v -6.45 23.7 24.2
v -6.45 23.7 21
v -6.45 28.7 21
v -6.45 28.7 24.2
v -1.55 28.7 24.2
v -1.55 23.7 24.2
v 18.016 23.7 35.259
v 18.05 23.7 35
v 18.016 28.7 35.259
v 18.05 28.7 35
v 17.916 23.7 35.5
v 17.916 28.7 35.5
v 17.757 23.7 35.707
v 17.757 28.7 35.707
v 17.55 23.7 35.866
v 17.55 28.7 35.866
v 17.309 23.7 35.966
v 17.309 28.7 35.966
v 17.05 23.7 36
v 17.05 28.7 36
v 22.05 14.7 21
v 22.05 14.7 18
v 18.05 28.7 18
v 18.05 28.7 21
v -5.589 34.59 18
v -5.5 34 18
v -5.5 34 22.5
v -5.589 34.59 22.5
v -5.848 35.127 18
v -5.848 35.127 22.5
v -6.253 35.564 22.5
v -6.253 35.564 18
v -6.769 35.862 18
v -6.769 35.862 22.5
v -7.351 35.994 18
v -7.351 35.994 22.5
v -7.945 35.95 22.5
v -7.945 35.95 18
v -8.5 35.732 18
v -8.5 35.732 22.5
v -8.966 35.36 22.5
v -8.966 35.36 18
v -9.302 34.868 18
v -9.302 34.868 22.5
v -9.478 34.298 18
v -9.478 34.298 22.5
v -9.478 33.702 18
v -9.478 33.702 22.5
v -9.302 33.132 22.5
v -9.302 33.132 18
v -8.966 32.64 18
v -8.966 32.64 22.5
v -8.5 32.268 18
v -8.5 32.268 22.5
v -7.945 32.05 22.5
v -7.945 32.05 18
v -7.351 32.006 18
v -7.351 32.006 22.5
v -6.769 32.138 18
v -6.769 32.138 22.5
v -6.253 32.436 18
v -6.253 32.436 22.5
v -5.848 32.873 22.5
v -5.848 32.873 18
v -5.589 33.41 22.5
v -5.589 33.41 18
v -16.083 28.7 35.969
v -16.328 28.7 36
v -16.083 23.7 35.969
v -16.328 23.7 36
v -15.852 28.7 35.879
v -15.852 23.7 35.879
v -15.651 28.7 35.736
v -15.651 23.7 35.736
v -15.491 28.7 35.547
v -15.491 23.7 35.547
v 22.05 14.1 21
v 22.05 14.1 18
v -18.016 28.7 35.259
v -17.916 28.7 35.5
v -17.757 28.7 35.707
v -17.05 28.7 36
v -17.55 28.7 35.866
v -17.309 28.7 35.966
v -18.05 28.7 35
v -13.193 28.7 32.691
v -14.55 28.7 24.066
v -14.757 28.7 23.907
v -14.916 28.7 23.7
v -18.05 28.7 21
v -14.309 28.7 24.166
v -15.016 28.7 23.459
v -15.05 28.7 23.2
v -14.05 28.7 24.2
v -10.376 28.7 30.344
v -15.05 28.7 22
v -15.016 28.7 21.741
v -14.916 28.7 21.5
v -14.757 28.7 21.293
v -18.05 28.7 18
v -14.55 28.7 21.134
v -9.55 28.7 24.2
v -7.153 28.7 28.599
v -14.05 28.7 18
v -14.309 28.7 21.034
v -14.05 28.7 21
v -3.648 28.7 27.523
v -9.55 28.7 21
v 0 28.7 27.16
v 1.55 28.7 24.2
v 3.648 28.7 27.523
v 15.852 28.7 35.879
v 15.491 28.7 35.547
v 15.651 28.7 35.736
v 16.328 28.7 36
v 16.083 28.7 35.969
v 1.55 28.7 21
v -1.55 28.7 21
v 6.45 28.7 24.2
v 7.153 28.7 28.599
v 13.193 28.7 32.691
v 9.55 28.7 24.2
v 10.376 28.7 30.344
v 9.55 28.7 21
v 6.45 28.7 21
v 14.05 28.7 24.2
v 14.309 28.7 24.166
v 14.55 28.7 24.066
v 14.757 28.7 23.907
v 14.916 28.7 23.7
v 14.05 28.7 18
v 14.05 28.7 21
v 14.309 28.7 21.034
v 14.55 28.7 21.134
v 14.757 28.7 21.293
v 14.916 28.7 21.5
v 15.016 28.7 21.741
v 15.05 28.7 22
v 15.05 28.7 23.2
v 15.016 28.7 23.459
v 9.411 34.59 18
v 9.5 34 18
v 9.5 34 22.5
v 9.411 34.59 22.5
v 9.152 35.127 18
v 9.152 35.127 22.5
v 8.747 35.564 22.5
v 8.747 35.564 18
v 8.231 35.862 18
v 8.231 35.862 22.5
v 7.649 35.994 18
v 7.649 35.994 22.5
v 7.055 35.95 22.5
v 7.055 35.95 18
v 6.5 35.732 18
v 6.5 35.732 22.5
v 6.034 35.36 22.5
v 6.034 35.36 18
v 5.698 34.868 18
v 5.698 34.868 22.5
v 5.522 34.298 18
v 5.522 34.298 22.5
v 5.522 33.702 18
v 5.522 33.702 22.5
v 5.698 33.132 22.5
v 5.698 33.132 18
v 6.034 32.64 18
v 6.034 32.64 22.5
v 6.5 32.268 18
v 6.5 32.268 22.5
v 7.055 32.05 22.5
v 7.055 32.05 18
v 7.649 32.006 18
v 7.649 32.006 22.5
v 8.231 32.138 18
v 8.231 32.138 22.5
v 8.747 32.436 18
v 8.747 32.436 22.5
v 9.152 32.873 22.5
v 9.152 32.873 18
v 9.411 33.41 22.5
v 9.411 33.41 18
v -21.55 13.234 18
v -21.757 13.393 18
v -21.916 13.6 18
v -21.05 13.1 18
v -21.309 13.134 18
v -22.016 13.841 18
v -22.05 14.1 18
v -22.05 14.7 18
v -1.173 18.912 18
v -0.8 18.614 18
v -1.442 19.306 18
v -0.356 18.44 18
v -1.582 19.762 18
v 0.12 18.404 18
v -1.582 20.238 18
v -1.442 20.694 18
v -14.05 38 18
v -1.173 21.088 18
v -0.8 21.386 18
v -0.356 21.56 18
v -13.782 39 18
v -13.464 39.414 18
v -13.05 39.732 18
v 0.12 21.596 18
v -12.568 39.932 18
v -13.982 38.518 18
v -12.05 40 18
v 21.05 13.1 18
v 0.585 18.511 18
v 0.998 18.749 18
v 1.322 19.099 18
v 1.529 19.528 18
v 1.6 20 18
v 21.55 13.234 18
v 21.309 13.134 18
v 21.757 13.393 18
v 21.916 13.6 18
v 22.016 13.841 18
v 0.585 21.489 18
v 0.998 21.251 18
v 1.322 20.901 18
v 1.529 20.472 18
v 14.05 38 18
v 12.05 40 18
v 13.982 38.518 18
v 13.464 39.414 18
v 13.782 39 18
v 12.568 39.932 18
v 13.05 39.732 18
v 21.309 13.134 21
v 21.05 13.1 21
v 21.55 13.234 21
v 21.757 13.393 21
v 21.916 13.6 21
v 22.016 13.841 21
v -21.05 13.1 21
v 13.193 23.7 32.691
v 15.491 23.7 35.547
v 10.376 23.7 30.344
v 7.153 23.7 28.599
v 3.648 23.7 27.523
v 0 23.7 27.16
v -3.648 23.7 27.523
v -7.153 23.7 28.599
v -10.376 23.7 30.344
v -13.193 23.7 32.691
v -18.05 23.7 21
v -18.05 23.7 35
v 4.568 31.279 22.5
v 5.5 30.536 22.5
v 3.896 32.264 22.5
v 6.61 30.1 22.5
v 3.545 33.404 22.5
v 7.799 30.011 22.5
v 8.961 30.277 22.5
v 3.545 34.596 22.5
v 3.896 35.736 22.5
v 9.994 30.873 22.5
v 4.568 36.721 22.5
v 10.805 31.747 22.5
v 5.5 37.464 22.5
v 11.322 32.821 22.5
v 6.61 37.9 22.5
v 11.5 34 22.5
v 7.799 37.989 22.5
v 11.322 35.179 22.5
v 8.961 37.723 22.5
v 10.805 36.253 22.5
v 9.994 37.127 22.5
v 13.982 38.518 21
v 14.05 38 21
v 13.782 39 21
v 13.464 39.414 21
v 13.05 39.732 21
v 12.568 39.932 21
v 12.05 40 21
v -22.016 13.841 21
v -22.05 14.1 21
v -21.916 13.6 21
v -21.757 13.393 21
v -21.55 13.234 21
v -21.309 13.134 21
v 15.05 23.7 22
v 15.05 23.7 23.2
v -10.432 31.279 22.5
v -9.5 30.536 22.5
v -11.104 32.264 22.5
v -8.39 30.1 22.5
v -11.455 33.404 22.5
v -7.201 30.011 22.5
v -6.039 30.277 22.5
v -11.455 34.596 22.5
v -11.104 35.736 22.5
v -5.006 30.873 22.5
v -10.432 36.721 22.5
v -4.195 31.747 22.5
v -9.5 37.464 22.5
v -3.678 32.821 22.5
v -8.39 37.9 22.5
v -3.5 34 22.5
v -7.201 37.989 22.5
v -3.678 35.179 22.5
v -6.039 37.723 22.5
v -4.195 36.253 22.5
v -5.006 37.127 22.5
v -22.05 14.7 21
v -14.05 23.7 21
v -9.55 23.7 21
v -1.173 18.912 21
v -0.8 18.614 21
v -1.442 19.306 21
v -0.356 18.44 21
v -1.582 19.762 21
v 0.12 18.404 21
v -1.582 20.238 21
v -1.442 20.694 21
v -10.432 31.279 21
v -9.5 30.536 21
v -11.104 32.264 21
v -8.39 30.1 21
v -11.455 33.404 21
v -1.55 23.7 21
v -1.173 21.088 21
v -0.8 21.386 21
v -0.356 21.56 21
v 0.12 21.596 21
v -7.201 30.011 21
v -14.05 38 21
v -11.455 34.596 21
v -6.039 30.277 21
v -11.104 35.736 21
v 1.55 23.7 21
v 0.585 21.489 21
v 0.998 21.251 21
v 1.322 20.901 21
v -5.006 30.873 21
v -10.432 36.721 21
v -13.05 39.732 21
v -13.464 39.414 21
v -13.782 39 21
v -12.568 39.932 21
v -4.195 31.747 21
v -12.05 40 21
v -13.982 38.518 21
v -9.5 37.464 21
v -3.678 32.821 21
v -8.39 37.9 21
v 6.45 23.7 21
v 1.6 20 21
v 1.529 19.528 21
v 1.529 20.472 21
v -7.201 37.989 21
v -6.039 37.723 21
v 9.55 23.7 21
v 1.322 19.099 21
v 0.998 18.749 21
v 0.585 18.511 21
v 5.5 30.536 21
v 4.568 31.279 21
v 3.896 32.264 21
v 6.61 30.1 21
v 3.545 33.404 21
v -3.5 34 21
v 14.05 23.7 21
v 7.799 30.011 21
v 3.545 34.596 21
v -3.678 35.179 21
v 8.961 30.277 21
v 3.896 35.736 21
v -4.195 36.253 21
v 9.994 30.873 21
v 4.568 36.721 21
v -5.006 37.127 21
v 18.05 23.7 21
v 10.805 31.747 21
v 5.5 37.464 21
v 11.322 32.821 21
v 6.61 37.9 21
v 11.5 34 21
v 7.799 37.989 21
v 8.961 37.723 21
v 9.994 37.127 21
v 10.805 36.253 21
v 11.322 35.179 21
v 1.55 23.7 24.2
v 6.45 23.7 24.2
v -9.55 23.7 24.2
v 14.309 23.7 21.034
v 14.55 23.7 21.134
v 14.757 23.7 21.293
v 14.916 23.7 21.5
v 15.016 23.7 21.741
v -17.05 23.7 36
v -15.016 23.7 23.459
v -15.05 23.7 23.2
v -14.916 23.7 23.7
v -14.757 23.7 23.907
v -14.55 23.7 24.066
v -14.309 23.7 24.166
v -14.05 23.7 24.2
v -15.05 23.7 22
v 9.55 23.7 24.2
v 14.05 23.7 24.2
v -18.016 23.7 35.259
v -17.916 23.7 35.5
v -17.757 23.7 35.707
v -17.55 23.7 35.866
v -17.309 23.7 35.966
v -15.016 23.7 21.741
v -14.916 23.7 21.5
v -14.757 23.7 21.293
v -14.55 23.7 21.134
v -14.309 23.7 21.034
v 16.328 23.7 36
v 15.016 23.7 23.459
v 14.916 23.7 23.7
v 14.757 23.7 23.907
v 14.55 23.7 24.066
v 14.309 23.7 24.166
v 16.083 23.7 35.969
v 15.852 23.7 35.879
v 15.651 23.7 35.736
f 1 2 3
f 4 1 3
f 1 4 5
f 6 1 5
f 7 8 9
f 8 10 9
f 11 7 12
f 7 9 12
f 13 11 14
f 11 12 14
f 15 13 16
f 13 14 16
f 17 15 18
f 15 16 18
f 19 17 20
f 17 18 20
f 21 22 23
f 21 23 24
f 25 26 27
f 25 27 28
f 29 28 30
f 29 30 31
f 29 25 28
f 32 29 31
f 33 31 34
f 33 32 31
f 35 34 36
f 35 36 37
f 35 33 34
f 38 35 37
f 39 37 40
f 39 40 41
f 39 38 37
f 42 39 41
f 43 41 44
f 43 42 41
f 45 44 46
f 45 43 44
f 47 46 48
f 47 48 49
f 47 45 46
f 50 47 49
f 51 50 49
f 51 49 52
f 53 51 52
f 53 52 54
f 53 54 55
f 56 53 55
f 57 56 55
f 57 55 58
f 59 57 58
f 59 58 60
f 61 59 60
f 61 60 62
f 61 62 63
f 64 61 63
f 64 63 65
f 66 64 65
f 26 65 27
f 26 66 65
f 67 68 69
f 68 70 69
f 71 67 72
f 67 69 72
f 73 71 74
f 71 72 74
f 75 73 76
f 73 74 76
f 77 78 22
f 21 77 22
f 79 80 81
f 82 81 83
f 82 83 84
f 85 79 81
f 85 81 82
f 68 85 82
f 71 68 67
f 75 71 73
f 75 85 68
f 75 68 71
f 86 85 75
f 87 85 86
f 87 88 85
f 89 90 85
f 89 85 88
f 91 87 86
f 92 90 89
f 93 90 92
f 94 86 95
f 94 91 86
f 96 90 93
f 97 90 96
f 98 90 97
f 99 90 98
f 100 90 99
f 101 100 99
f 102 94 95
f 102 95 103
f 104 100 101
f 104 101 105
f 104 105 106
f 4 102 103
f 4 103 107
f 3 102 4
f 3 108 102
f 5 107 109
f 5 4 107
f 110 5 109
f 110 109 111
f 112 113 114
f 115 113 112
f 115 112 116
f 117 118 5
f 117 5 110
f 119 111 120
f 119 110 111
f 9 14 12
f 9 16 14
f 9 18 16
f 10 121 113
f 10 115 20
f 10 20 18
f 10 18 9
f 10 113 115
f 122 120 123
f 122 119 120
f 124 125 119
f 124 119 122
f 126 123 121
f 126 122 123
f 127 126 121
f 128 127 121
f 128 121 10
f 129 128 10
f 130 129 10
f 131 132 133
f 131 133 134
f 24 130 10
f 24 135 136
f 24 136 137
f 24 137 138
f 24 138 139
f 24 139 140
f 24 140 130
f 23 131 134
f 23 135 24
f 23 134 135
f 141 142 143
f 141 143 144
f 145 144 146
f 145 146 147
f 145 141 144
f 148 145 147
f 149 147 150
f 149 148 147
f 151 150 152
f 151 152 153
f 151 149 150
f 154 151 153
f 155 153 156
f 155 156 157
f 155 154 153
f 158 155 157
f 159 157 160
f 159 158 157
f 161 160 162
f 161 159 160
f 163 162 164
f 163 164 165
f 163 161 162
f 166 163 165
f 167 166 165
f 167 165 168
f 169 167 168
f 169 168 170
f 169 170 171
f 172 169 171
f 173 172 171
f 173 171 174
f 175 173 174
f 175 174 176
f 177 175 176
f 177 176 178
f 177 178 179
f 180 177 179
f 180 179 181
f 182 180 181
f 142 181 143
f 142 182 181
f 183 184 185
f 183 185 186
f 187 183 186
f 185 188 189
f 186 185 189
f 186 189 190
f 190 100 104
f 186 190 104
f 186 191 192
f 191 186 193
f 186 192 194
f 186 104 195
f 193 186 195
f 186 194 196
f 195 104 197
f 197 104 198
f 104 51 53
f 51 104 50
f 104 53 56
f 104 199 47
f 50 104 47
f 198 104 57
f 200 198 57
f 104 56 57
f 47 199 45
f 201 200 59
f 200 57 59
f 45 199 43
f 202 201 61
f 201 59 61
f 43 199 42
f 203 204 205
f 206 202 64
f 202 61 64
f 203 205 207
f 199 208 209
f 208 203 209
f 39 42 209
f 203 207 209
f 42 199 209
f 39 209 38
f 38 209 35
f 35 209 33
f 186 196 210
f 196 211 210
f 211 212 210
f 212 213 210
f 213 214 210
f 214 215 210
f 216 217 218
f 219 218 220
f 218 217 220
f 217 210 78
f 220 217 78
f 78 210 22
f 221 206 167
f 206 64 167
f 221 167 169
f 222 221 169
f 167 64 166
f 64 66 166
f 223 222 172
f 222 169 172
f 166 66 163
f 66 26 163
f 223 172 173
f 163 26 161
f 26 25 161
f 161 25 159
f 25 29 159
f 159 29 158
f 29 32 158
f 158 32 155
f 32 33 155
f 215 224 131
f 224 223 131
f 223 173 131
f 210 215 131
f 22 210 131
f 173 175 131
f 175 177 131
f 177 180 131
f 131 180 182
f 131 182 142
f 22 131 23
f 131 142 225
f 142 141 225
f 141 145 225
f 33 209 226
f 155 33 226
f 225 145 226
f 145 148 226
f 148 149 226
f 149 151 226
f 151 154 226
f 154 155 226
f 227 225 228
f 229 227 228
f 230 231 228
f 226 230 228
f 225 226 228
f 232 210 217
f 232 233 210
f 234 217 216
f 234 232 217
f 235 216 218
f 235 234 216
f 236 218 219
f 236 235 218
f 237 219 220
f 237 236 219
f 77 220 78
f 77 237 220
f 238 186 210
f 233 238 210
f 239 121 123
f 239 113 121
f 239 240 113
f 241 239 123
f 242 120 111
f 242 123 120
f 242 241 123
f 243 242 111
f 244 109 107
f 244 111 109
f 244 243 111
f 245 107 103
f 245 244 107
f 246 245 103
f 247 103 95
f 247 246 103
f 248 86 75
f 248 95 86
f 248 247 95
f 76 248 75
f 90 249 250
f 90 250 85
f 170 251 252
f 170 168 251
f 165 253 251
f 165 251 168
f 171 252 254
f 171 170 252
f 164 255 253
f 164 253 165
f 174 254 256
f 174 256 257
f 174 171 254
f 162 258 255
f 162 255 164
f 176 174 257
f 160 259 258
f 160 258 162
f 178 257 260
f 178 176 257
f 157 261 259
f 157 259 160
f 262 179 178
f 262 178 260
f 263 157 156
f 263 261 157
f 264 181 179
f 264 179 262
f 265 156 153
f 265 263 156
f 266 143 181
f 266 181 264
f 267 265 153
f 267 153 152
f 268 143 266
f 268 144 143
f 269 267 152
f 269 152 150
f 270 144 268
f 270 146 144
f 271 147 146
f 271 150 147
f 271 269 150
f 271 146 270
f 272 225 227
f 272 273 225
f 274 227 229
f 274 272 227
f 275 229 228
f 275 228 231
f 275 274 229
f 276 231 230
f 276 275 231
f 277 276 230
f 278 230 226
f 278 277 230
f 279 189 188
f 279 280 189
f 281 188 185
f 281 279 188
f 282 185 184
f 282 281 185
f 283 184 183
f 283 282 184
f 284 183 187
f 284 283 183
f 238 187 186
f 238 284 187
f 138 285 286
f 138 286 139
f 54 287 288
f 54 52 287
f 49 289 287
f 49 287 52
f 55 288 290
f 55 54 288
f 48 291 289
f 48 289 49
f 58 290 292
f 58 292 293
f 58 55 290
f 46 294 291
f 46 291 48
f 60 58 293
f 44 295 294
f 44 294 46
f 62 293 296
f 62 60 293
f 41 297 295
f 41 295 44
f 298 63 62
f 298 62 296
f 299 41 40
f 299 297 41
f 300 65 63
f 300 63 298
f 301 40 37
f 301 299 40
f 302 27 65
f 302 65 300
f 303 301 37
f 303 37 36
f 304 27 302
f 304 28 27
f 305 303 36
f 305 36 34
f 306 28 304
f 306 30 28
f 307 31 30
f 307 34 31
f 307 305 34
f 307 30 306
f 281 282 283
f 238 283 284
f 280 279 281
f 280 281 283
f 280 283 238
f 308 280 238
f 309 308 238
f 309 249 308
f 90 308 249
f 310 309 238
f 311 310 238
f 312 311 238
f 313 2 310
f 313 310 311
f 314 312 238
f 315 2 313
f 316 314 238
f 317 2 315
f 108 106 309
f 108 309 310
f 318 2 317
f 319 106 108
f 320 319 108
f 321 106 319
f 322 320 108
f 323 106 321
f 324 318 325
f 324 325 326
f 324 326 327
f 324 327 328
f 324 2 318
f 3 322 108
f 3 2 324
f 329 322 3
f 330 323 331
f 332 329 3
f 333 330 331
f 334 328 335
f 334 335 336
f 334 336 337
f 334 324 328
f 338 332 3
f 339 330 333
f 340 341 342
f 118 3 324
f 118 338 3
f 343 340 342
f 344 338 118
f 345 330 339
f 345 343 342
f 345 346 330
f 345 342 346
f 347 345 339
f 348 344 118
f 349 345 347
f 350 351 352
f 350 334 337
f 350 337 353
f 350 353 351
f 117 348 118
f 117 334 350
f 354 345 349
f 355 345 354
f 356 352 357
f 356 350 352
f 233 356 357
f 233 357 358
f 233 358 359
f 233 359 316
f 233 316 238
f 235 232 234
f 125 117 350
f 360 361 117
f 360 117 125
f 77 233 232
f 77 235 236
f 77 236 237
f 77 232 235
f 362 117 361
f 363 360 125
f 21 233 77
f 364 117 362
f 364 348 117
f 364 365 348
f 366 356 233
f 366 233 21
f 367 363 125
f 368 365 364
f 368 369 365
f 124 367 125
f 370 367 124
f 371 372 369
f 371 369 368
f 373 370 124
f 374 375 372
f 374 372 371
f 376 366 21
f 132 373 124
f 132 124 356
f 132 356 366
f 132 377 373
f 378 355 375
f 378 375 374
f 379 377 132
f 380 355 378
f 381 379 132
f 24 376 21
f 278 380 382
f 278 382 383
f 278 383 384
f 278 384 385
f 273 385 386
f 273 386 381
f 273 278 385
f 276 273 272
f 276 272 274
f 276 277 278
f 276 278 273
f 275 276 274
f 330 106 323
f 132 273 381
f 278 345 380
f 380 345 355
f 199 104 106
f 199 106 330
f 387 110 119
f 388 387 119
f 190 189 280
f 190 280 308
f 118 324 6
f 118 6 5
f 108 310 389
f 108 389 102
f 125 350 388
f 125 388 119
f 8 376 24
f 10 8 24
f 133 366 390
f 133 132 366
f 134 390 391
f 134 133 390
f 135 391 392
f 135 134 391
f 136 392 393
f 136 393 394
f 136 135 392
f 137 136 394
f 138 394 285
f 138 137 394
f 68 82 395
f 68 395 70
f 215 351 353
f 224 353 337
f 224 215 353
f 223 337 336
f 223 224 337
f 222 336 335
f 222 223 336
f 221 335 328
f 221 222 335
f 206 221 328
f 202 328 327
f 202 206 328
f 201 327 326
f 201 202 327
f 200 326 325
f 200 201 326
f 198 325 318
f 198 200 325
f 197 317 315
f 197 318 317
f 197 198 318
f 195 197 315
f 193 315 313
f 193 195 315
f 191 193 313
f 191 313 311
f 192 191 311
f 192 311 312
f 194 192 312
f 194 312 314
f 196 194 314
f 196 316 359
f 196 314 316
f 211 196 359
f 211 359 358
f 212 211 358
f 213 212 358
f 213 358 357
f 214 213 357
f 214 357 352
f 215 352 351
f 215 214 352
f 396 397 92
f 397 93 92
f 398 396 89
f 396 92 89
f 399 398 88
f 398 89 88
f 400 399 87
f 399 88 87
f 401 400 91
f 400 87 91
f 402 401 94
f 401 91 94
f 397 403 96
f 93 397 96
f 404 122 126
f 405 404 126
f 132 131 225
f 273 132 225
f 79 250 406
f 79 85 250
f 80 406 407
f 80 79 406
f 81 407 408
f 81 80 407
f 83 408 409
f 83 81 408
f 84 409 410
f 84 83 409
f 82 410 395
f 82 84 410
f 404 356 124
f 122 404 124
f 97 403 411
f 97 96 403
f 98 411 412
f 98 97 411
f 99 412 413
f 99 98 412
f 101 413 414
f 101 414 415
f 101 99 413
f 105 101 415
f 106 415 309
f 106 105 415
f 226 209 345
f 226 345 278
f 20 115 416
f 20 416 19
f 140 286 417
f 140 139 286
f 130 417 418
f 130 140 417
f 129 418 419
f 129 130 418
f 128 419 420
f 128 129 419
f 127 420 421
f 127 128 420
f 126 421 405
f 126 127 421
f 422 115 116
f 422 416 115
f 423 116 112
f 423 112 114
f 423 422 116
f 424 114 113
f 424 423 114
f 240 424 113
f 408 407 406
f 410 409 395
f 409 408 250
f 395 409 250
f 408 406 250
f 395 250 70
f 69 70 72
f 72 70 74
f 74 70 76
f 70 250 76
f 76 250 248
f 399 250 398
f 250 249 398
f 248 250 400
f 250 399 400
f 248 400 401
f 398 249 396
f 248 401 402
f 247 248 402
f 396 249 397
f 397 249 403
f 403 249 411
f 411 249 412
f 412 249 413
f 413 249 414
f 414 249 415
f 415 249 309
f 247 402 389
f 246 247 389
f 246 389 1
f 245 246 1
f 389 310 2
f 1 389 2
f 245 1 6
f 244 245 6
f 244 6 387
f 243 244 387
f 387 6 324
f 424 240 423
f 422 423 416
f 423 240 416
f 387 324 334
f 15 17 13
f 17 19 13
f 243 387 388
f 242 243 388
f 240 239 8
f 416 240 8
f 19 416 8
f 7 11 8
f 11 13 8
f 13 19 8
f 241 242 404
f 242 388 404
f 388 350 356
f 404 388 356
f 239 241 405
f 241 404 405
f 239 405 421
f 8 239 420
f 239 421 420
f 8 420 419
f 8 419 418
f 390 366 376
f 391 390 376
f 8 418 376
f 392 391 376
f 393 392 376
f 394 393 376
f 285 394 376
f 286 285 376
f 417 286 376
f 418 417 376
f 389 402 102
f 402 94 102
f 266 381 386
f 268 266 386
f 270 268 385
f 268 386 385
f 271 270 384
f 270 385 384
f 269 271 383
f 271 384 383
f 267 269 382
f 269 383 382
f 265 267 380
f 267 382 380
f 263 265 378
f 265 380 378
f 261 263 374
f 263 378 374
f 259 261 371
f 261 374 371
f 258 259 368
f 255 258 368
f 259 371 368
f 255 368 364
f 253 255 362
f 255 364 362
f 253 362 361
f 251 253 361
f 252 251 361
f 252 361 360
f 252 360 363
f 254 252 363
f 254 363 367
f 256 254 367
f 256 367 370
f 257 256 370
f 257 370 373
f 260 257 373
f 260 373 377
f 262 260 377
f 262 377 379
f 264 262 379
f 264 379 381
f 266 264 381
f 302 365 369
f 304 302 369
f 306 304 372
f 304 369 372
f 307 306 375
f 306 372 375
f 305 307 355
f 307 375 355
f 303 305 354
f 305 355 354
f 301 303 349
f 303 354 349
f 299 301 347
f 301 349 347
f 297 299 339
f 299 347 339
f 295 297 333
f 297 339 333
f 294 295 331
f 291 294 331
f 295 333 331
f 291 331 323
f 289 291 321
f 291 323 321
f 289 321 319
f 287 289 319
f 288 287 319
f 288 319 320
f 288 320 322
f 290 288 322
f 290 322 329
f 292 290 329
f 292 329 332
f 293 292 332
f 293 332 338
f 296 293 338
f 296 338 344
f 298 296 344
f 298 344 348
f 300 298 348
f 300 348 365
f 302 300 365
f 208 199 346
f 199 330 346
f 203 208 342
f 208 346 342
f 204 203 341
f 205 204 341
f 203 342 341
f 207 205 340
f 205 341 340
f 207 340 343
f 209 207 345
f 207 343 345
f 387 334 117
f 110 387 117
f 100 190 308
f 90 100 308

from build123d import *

# Parameters (mm, degrees)
CYLINDER006_R                   = 1.6
CYLINDER006_DEPTH               = 10
BOX007_W                        = 3.1
BOX007_H                        = 5
BOX007_DEPTH                    = 8
BOX009_W                        = 3.1
BOX009_H                        = 5
BOX009_DEPTH                    = 9
BOX010_W                        = 3.1
BOX010_H                        = 5
BOX010_DEPTH                    = 9
BOX012_W                        = 31
BOX012_H                        = 6
BOX012_DEPTH                    = 6
CYLINDER004_R                   = 21.5
CYLINDER004_DEPTH               = 10
BOX008_W                        = 30.1
BOX008_H                        = 5
BOX008_DEPTH                    = 18
FILLET001003_R                  = 1
FILLET001007_R                  = 1
CYLINDER003_R                   = 18.5
CYLINDER003_DEPTH               = 10
BOX005_W                        = 36.1
BOX005_H                        = 5
BOX005_DEPTH                    = 18
FILLET001004_R                  = 1
CYLINDER010_R                   = 2
CYLINDER010_DEPTH               = 4.5
CYLINDER011_R                   = 2
CYLINDER011_DEPTH               = 4.5
CYLINDER008_R                   = 4
CYLINDER008_DEPTH               = 4.5
BOX011_W                        = 28.1
BOX011_H                        = 12
BOX011_DEPTH                    = 3
FILLET001006_R                  = 2
CYLINDER009_R                   = 4
CYLINDER009_DEPTH               = 4.5
BOX006_W                        = 44.1
BOX006_H                        = 15.6
BOX006_DEPTH                    = 3
FILLET001005_R                  = 1
CHAMFER005021077002006002_SIZE2 = 14
CHAMFER005021077002006002_SIZE  = 4
CHAMFER005021077002006003_SIZE2 = 14
CHAMFER005021077002006003_SIZE  = 4


with BuildPart() as cylinder006:
    # Cylinder006 → Cylinder006 (new body)
    with BuildSketch(Plane(origin=(0, 20, 18), x_dir=(1, 0, 0), z_dir=(0, 0, 1))):
        Circle(CYLINDER006_R)
    extrude(amount=CYLINDER006_DEPTH)


with BuildPart() as cube007:
    # Box007 → Box007 (new body)
    with BuildSketch(Plane(origin=(-1.55, 13.5, 18), x_dir=(1, 0, 0), z_dir=(0, 0, 1))):
        with Locations((1.55, 2.5)):
            Rectangle(BOX007_W, BOX007_H)
    extrude(amount=BOX007_DEPTH)


with BuildPart() as cube009:
    # Box009 → Box009 (new body)
    with BuildSketch(Plane(origin=(-9.55, 13.5, 18), x_dir=(1, 0, 0), z_dir=(0, 0, 1))):
        with Locations((1.55, 2.5)):
            Rectangle(BOX009_W, BOX009_H)
    extrude(amount=BOX009_DEPTH)


with BuildPart() as fusion036012039011002025018010027010:
    # Box010 → Box010 (new body)
    with BuildSketch(Plane(origin=(6.45, 13.5, 18), x_dir=(1, 0, 0), z_dir=(0, 0, 1))):
        with Locations((1.55, 2.5)):
            Rectangle(BOX010_W, BOX010_H)
    extrude(amount=BOX010_DEPTH)

    # Fusion036012039011002025018010027010: union Cube007, Cube009
    add(cube007.part)
    add(cube009.part)


with BuildPart() as fusion036012039011002025018010027011:
    # Box012 → Box012 (new body)
    with BuildSketch(Plane(origin=(-15.5, 13.2, 24.2), x_dir=(1, 0, 0), z_dir=(0, 0, 1))):
        with Locations((15.5, 3)):
            Rectangle(BOX012_W, BOX012_H)
    extrude(amount=BOX012_DEPTH)

    # Fusion036012039011002025018010027011: union Fusion036012039011002025018010027010
    add(fusion036012039011002025018010027010.part)


with BuildPart() as cylinder004:
    # Cylinder004 → Cylinder004 (new body)
    with BuildSketch(Plane(origin=(0, 10.3, 45.66), x_dir=(1, 0, 0), z_dir=(0, 1, 0))):
        Circle(CYLINDER004_R)
    extrude(amount=CYLINDER004_DEPTH)


with BuildPart() as fillet001007:
    # Box008 → Box008 (new body)
    with BuildSketch(Plane(origin=(-15.05, 13.5, 21), x_dir=(1, 0, 0), z_dir=(0, 0, 1))):
        with Locations((15.05, 2.5)):
            Rectangle(BOX008_W, BOX008_H)
    extrude(amount=BOX008_DEPTH)

    # Cut003: cut Cylinder004
    add(cylinder004.part, mode=Mode.SUBTRACT)

    # Fillet001003
    fillet001003_edges = [fillet001007.edges().sort_by_distance(p)[0] for p in [
        (-15.05, 16, 30.305929),
        (-15.05, 16, 21),
        (15.05, 16, 30.305929),
        (15.05, 16, 21),
    ]]
    fillet(fillet001003_edges, radius=FILLET001003_R)

    # Cut005003: cut Fusion036012039011002025018010027011
    add(fusion036012039011002025018010027011.part, mode=Mode.SUBTRACT)

    # Fillet001007
    fillet001007_edges = [fillet001007.edges().sort_by_distance(p)[0] for p in [
        (-15.05, 16, 24.2),
        (15.05, 16, 24.2),
    ]]
    fillet(fillet001007_edges, radius=FILLET001007_R)


with BuildPart() as cylinder003:
    # Cylinder003 → Cylinder003 (new body)
    with BuildSketch(Plane(origin=(0, 10.3, 45.66), x_dir=(1, 0, 0), z_dir=(0, 1, 0))):
        Circle(CYLINDER003_R)
    extrude(amount=CYLINDER003_DEPTH)


with BuildPart() as cut005004:
    # Box005 → Box005 (new body)
    with BuildSketch(Plane(origin=(-18.05, 13.5, 18), x_dir=(1, 0, 0), z_dir=(0, 0, 1))):
        with Locations((18.05, 2.5)):
            Rectangle(BOX005_W, BOX005_H)
    extrude(amount=BOX005_DEPTH)

    # Cut002: cut Cylinder003
    add(cylinder003.part, mode=Mode.SUBTRACT)

    # Fillet001004
    fillet001004_edges = [cut005004.edges().sort_by_distance(p)[0] for p in [
        (-18.05, 16, 36),
        (-15.777655, 16, 36),
        (18.05, 16, 36),
        (15.777655, 16, 36),
    ]]
    fillet(fillet001004_edges, radius=FILLET001004_R)

    # Cut005004: cut Fillet001007
    add(fillet001007.part, mode=Mode.SUBTRACT)


with BuildPart() as cut005004_1:
    # Cut005004 placement: moved
    add(cut005004.part.moved(Location((0, 10.2, 0))))


with BuildPart() as cylinder010:
    # Cylinder010 → Cylinder010 (new body)
    with BuildSketch(Plane(origin=(7.5, 34, 18), x_dir=(1, 0, 0), z_dir=(0, 0, 1))):
        Circle(CYLINDER010_R)
    extrude(amount=CYLINDER010_DEPTH)


with BuildPart() as fusion036012039011002025018010027009:
    # Cylinder011 → Cylinder011 (new body)
    with BuildSketch(Plane(origin=(-7.5, 34, 18), x_dir=(1, 0, 0), z_dir=(0, 0, 1))):
        Circle(CYLINDER011_R)
    extrude(amount=CYLINDER011_DEPTH)

    # Fusion036012039011002025018010027009: union Cylinder010
    add(cylinder010.part)


with BuildPart() as cylinder008:
    # Cylinder008 → Cylinder008 (new body)
    with BuildSketch(Plane(origin=(-7.5, 34, 18), x_dir=(1, 0, 0), z_dir=(0, 0, 1))):
        Circle(CYLINDER008_R)
    extrude(amount=CYLINDER008_DEPTH)


with BuildPart() as fillet001006:
    # Box011 → Box011 (new body)
    with BuildSketch(Plane(origin=(-14.05, 28, 18), x_dir=(1, 0, 0), z_dir=(0, 0, 1))):
        with Locations((14.05, 6)):
            Rectangle(BOX011_W, BOX011_H)
    extrude(amount=BOX011_DEPTH)

    # Fillet001006
    fillet001006_edges = [fillet001006.edges().sort_by_distance(p)[0] for p in [
        (-14.05, 40, 19.5),
        (14.05, 40, 19.5),
    ]]
    fillet(fillet001006_edges, radius=FILLET001006_R)


with BuildPart() as cut005002:
    # Cylinder009 → Cylinder009 (new body)
    with BuildSketch(Plane(origin=(7.5, 34, 18), x_dir=(1, 0, 0), z_dir=(0, 0, 1))):
        Circle(CYLINDER009_R)
    extrude(amount=CYLINDER009_DEPTH)

    # Fusion036012039011002025018010027008: union Cylinder008, Fillet001006
    add(cylinder008.part)
    add(fillet001006.part)

    # Cut005002: cut Fusion036012039011002025018010027009
    add(fusion036012039011002025018010027009.part, mode=Mode.SUBTRACT)


with BuildPart() as cut005005:
    # Box006 → Box006 (new body)
    with BuildSketch(Plane(origin=(-22.05, 13.1, 18), x_dir=(1, 0, 0), z_dir=(0, 0, 1))):
        with Locations((22.05, 7.8)):
            Rectangle(BOX006_W, BOX006_H)
    extrude(amount=BOX006_DEPTH)

    # Fillet001005
    fillet001005_edges = [cut005005.edges().sort_by_distance(p)[0] for p in [
        (-22.05, 13.1, 19.5),
        (22.05, 13.1, 19.5),
    ]]
    fillet(fillet001005_edges, radius=FILLET001005_R)

    # Chamfer005021077002006002
    chamfer005021077002006002_edges = [cut005005.edges().sort_by_distance(p)[0] for p in [
        (22.05, 28.7, 19.5),
    ]]
    chamfer005021077002006002_side = cut005005.faces().sort_by_distance((0, 28.7, 19.5))[0]
    chamfer(chamfer005021077002006002_edges, length=CHAMFER005021077002006002_SIZE, length2=CHAMFER005021077002006002_SIZE2, reference=chamfer005021077002006002_side)

    # Chamfer005021077002006003
    chamfer005021077002006003_edges = [cut005005.edges().sort_by_distance(p)[0] for p in [
        (-22.05, 28.7, 19.5),
    ]]
    chamfer005021077002006003_side = cut005005.faces().sort_by_distance((-2, 28.7, 19.5))[0]
    chamfer(chamfer005021077002006003_edges, length=CHAMFER005021077002006003_SIZE, length2=CHAMFER005021077002006003_SIZE2, reference=chamfer005021077002006003_side)

    # Fusion036012039011002025018010027012: union Cut005004, Cut005002
    add(cut005004_1.part)
    add(cut005002.part)

    # Cut005005: cut Cylinder006
    add(cylinder006.part, mode=Mode.SUBTRACT)


solid = cut005005.part
